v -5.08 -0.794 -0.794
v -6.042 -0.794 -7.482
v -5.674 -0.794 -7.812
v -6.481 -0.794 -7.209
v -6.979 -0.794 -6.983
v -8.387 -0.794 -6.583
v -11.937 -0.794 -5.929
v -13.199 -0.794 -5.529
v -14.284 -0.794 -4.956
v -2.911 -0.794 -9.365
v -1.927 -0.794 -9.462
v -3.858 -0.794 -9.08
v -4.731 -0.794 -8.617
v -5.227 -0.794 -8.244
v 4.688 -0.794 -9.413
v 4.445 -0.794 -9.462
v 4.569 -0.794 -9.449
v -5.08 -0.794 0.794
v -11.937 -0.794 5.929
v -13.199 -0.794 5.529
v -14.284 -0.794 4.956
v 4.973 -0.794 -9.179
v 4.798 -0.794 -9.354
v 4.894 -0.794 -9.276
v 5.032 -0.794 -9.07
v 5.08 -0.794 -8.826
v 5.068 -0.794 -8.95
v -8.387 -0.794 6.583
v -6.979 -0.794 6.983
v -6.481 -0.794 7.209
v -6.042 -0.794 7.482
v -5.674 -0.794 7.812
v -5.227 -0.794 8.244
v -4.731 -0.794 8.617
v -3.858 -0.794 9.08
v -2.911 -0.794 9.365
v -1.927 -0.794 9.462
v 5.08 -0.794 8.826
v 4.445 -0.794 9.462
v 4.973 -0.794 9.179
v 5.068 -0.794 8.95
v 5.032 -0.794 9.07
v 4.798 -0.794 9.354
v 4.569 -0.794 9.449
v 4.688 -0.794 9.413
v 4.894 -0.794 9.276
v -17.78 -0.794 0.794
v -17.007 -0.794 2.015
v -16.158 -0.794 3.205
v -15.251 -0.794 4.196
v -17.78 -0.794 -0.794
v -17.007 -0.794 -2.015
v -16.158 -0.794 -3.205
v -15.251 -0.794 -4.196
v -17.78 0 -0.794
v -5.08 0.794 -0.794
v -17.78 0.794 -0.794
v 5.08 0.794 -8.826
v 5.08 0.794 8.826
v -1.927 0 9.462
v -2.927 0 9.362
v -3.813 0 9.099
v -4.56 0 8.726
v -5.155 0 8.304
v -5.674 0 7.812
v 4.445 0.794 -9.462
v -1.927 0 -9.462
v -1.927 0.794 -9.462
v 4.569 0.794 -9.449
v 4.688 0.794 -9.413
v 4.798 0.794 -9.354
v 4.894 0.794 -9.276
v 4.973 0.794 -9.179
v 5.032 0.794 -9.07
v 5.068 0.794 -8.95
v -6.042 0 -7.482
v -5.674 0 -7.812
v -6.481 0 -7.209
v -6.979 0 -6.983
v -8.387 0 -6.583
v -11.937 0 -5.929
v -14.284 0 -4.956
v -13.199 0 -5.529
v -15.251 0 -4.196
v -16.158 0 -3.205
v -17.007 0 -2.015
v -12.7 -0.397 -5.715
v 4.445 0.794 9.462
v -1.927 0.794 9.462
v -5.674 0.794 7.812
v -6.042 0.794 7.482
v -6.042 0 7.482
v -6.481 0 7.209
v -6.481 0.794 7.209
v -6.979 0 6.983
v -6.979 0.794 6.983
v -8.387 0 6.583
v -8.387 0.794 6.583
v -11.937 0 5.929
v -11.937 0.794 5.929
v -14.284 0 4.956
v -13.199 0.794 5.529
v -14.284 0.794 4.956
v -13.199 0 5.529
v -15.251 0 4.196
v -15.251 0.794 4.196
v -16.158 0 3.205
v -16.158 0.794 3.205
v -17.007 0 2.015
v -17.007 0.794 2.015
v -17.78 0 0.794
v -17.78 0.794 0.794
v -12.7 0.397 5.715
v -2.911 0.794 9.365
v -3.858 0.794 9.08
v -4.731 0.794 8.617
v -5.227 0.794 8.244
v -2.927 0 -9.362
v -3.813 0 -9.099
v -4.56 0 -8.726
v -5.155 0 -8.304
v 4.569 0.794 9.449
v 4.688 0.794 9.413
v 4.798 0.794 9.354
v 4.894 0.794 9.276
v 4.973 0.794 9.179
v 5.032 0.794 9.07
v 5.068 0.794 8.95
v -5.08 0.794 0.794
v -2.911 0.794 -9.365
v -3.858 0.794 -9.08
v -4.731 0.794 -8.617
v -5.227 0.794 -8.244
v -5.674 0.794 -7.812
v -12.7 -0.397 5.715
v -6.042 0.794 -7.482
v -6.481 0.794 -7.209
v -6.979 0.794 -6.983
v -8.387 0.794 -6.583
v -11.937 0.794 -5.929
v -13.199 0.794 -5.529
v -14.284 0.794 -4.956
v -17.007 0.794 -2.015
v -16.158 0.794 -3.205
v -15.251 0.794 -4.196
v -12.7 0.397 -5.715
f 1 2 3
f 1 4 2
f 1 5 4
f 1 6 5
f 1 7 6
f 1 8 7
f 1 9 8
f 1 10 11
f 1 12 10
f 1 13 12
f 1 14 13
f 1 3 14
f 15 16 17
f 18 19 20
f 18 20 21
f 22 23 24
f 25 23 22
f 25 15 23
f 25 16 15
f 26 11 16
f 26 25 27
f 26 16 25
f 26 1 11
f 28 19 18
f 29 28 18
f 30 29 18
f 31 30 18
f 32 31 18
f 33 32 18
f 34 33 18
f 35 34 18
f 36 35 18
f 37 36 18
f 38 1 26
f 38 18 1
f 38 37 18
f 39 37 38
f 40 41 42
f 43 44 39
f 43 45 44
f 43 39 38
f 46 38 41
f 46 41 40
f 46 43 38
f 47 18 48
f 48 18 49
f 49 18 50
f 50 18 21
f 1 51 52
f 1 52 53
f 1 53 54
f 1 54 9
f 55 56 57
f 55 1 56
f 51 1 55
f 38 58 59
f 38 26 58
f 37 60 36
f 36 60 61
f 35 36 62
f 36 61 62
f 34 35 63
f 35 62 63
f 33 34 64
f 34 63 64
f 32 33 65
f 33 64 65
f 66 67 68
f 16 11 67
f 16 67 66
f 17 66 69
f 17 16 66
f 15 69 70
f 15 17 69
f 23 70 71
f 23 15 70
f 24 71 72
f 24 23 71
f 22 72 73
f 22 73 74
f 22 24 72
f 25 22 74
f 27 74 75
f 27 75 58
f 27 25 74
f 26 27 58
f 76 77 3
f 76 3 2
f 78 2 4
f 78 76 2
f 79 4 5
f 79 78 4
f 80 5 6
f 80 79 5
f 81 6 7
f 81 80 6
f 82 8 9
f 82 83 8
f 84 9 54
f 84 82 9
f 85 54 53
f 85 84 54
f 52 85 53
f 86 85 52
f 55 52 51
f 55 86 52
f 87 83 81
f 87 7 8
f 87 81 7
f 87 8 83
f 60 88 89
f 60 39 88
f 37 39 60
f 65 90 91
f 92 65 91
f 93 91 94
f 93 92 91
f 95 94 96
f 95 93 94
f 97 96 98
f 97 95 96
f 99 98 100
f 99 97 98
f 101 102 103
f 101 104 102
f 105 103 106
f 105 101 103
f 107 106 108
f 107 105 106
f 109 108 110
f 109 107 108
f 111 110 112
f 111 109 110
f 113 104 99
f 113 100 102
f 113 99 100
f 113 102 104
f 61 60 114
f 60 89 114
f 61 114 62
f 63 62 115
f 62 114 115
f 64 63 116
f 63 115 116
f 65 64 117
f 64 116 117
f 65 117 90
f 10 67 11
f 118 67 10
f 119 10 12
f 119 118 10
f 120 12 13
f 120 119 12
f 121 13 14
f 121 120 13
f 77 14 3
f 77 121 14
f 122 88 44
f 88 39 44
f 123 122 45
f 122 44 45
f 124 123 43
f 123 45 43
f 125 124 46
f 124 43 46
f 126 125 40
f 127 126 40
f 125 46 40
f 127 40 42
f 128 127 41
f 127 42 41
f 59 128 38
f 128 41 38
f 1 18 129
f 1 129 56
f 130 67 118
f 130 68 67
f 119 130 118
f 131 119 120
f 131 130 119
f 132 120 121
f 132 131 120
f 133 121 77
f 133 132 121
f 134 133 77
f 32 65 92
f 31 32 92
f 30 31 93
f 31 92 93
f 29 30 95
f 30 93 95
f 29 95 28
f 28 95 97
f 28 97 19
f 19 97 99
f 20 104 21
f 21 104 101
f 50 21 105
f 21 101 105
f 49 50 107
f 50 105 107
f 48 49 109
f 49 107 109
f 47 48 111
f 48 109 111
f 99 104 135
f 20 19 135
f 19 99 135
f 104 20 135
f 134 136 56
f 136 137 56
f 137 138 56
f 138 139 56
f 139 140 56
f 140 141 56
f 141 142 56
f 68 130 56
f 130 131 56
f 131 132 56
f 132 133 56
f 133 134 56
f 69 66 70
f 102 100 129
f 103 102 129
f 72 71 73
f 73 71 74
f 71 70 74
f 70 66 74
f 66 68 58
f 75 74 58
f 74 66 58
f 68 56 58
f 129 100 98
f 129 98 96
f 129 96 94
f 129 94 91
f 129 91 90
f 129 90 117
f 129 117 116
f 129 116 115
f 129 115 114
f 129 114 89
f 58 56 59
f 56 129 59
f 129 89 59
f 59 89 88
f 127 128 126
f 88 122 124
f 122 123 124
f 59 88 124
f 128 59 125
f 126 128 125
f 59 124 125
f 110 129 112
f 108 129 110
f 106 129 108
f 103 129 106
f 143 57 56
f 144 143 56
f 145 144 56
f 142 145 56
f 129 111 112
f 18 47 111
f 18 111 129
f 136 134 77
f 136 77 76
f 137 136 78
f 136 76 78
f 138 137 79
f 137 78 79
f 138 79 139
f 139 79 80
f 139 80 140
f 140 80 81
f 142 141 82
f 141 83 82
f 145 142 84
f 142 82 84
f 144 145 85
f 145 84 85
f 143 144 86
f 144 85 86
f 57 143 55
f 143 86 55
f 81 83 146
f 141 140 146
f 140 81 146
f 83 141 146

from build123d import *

# Parameters (mm, degrees)
F1_DEPTH = 0.79375
F2_R     = 0.635
F3_R     = 5.08


with BuildPart() as f1:
    # F0 (on Front) → F1 (new body, symmetric)
    with BuildSketch(Plane.XZ):
        with BuildLine():
            Line((-5.08, -9.4615), (5.08, -9.4615))
            Line((5.08, -9.4615), (5.08, 9.4615))
            Line((5.08, 9.4615), (-5.08, 9.4615))
            add(Edge.make_bspline(
                [(-5.08, 9.4615), (-5.08, 6.1859851204), (-14.0601360435, 7.136818114), (-16.564456746, 2.7273960877), (-17.78, 0.79375)],
                knots=[0, 0, 0, 0, 0.5228302589, 1, 1, 1, 1], degree=3))
            Line((-17.78, 0.79375), (-5.08, 0.79375))
            Line((-5.08, 0.79375), (-5.08, -0.79375))
            Line((-5.08, -0.79375), (-17.78, -0.79375))
            add(Edge.make_bspline(
                [(-5.08, -9.4615), (-5.08, -6.1859851204), (-14.0601360435, -7.136818114), (-16.564456746, -2.7273960877), (-17.78, -0.79375)],
                knots=[0, 0, 0, 0, 0.5228302589, 1, 1, 1, 1], degree=3))
        make_face()
    extrude(amount=F1_DEPTH, both=True)

    # F2
    f2_edges = [f1.edges().sort_by_distance(p)[0] for p in [
        (5.08, 0, 9.4615),
        (5.08, 0, -9.4615),
    ]]
    fillet(f2_edges, radius=F2_R)

    # F3
    f3_edges = [f1.edges().sort_by_distance(p)[0] for p in [
        (-5.08, 0.396875, 9.4615),
        (-5.08, -0.396875, 9.4615),
        (-5.08, 0.396875, -9.4615),
        (-5.08, -0.396875, -9.4615),
    ]]
    fillet(f3_edges, radius=F3_R)


solid = f1.part
